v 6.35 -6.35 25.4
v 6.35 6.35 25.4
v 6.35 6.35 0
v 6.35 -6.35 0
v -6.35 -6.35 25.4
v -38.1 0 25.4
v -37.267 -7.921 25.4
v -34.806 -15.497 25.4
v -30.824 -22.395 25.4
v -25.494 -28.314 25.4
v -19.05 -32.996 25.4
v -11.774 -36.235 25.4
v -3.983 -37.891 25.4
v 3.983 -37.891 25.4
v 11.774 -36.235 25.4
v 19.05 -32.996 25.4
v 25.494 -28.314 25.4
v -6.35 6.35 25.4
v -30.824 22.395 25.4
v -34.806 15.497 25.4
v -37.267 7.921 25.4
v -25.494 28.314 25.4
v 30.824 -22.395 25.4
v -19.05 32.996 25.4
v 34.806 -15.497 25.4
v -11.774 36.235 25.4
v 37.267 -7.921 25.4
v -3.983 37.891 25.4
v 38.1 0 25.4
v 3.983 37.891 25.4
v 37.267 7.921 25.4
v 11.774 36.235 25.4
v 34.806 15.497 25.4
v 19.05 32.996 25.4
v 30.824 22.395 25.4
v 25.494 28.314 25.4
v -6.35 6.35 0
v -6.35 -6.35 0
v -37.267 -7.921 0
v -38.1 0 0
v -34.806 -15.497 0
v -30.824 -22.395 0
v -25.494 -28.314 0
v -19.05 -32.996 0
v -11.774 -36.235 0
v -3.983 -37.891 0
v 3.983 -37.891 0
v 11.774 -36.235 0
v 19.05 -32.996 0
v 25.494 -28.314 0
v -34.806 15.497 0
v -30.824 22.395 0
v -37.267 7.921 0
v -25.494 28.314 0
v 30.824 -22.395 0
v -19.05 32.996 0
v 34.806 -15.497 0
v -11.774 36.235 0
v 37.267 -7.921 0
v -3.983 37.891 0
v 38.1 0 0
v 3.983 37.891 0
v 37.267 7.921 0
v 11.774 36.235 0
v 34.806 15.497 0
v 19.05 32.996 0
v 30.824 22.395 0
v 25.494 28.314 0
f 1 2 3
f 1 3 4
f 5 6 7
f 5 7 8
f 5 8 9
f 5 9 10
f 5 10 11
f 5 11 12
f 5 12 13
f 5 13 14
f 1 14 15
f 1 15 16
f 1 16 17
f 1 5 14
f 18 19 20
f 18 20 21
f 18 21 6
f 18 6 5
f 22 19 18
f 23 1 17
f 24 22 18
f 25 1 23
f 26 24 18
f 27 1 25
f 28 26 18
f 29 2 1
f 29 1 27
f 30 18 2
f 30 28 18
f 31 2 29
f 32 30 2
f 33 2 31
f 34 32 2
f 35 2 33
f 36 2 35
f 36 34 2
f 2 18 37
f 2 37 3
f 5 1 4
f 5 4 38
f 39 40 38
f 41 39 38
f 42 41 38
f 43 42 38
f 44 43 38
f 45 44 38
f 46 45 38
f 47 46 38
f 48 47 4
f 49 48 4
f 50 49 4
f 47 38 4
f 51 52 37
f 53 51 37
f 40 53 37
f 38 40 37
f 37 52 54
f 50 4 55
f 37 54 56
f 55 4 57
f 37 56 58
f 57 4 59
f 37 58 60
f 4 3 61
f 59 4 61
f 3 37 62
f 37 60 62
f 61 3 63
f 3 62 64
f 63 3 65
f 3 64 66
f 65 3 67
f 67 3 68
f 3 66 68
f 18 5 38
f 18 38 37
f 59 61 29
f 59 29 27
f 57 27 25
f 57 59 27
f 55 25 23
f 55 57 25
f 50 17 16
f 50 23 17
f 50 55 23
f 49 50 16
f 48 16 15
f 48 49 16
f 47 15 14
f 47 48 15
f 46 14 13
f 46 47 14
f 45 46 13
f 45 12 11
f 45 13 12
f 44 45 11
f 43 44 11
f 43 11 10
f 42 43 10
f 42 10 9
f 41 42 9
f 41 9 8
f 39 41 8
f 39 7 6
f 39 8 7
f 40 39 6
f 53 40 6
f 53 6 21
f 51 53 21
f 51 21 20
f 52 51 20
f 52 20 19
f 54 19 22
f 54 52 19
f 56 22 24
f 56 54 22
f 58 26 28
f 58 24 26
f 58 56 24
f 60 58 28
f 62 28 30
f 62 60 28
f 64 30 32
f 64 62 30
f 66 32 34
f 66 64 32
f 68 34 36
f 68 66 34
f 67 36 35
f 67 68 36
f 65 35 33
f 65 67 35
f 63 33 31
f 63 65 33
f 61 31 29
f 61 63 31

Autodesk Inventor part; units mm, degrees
ref_plane "YZ Plane" through (0, 0, 0) normal (1, 0, 0) x (0, 1, 0)
ref_plane "XZ Plane" through (0, 0, 0) normal (0, 1, 0) x (-1, 0, 0)
ref_plane "XY Plane" through (0, 0, 0) normal (0, 0, 1) x (1, 0, 0)
sketch "Sketch1" plane through (0, 0, 0) normal (0, 0, 1) x (1, 0, 0)
  circle A0 centre (0, 0) radius 38.1
  line L0 (-6.35, 6.35) -> (6.35, 6.35)
  line L1 (6.35, 6.35) -> (6.35, -6.35)
  line L2 (6.35, -6.35) -> (-6.35, -6.35)
  line L3 (-6.35, -6.35) -> (-6.35, 6.35)
  dimension "d0" = 76.2
  dimension "d1" = 12.7
  dimension "d2" = 12.7
  dimension "d3" = 6.35
  dimension "d4" = 6.35
extrude "Extrusion1" add sketch "Sketch1" along normal blind 25.4
properties part number "Random Compliance Wheel"
